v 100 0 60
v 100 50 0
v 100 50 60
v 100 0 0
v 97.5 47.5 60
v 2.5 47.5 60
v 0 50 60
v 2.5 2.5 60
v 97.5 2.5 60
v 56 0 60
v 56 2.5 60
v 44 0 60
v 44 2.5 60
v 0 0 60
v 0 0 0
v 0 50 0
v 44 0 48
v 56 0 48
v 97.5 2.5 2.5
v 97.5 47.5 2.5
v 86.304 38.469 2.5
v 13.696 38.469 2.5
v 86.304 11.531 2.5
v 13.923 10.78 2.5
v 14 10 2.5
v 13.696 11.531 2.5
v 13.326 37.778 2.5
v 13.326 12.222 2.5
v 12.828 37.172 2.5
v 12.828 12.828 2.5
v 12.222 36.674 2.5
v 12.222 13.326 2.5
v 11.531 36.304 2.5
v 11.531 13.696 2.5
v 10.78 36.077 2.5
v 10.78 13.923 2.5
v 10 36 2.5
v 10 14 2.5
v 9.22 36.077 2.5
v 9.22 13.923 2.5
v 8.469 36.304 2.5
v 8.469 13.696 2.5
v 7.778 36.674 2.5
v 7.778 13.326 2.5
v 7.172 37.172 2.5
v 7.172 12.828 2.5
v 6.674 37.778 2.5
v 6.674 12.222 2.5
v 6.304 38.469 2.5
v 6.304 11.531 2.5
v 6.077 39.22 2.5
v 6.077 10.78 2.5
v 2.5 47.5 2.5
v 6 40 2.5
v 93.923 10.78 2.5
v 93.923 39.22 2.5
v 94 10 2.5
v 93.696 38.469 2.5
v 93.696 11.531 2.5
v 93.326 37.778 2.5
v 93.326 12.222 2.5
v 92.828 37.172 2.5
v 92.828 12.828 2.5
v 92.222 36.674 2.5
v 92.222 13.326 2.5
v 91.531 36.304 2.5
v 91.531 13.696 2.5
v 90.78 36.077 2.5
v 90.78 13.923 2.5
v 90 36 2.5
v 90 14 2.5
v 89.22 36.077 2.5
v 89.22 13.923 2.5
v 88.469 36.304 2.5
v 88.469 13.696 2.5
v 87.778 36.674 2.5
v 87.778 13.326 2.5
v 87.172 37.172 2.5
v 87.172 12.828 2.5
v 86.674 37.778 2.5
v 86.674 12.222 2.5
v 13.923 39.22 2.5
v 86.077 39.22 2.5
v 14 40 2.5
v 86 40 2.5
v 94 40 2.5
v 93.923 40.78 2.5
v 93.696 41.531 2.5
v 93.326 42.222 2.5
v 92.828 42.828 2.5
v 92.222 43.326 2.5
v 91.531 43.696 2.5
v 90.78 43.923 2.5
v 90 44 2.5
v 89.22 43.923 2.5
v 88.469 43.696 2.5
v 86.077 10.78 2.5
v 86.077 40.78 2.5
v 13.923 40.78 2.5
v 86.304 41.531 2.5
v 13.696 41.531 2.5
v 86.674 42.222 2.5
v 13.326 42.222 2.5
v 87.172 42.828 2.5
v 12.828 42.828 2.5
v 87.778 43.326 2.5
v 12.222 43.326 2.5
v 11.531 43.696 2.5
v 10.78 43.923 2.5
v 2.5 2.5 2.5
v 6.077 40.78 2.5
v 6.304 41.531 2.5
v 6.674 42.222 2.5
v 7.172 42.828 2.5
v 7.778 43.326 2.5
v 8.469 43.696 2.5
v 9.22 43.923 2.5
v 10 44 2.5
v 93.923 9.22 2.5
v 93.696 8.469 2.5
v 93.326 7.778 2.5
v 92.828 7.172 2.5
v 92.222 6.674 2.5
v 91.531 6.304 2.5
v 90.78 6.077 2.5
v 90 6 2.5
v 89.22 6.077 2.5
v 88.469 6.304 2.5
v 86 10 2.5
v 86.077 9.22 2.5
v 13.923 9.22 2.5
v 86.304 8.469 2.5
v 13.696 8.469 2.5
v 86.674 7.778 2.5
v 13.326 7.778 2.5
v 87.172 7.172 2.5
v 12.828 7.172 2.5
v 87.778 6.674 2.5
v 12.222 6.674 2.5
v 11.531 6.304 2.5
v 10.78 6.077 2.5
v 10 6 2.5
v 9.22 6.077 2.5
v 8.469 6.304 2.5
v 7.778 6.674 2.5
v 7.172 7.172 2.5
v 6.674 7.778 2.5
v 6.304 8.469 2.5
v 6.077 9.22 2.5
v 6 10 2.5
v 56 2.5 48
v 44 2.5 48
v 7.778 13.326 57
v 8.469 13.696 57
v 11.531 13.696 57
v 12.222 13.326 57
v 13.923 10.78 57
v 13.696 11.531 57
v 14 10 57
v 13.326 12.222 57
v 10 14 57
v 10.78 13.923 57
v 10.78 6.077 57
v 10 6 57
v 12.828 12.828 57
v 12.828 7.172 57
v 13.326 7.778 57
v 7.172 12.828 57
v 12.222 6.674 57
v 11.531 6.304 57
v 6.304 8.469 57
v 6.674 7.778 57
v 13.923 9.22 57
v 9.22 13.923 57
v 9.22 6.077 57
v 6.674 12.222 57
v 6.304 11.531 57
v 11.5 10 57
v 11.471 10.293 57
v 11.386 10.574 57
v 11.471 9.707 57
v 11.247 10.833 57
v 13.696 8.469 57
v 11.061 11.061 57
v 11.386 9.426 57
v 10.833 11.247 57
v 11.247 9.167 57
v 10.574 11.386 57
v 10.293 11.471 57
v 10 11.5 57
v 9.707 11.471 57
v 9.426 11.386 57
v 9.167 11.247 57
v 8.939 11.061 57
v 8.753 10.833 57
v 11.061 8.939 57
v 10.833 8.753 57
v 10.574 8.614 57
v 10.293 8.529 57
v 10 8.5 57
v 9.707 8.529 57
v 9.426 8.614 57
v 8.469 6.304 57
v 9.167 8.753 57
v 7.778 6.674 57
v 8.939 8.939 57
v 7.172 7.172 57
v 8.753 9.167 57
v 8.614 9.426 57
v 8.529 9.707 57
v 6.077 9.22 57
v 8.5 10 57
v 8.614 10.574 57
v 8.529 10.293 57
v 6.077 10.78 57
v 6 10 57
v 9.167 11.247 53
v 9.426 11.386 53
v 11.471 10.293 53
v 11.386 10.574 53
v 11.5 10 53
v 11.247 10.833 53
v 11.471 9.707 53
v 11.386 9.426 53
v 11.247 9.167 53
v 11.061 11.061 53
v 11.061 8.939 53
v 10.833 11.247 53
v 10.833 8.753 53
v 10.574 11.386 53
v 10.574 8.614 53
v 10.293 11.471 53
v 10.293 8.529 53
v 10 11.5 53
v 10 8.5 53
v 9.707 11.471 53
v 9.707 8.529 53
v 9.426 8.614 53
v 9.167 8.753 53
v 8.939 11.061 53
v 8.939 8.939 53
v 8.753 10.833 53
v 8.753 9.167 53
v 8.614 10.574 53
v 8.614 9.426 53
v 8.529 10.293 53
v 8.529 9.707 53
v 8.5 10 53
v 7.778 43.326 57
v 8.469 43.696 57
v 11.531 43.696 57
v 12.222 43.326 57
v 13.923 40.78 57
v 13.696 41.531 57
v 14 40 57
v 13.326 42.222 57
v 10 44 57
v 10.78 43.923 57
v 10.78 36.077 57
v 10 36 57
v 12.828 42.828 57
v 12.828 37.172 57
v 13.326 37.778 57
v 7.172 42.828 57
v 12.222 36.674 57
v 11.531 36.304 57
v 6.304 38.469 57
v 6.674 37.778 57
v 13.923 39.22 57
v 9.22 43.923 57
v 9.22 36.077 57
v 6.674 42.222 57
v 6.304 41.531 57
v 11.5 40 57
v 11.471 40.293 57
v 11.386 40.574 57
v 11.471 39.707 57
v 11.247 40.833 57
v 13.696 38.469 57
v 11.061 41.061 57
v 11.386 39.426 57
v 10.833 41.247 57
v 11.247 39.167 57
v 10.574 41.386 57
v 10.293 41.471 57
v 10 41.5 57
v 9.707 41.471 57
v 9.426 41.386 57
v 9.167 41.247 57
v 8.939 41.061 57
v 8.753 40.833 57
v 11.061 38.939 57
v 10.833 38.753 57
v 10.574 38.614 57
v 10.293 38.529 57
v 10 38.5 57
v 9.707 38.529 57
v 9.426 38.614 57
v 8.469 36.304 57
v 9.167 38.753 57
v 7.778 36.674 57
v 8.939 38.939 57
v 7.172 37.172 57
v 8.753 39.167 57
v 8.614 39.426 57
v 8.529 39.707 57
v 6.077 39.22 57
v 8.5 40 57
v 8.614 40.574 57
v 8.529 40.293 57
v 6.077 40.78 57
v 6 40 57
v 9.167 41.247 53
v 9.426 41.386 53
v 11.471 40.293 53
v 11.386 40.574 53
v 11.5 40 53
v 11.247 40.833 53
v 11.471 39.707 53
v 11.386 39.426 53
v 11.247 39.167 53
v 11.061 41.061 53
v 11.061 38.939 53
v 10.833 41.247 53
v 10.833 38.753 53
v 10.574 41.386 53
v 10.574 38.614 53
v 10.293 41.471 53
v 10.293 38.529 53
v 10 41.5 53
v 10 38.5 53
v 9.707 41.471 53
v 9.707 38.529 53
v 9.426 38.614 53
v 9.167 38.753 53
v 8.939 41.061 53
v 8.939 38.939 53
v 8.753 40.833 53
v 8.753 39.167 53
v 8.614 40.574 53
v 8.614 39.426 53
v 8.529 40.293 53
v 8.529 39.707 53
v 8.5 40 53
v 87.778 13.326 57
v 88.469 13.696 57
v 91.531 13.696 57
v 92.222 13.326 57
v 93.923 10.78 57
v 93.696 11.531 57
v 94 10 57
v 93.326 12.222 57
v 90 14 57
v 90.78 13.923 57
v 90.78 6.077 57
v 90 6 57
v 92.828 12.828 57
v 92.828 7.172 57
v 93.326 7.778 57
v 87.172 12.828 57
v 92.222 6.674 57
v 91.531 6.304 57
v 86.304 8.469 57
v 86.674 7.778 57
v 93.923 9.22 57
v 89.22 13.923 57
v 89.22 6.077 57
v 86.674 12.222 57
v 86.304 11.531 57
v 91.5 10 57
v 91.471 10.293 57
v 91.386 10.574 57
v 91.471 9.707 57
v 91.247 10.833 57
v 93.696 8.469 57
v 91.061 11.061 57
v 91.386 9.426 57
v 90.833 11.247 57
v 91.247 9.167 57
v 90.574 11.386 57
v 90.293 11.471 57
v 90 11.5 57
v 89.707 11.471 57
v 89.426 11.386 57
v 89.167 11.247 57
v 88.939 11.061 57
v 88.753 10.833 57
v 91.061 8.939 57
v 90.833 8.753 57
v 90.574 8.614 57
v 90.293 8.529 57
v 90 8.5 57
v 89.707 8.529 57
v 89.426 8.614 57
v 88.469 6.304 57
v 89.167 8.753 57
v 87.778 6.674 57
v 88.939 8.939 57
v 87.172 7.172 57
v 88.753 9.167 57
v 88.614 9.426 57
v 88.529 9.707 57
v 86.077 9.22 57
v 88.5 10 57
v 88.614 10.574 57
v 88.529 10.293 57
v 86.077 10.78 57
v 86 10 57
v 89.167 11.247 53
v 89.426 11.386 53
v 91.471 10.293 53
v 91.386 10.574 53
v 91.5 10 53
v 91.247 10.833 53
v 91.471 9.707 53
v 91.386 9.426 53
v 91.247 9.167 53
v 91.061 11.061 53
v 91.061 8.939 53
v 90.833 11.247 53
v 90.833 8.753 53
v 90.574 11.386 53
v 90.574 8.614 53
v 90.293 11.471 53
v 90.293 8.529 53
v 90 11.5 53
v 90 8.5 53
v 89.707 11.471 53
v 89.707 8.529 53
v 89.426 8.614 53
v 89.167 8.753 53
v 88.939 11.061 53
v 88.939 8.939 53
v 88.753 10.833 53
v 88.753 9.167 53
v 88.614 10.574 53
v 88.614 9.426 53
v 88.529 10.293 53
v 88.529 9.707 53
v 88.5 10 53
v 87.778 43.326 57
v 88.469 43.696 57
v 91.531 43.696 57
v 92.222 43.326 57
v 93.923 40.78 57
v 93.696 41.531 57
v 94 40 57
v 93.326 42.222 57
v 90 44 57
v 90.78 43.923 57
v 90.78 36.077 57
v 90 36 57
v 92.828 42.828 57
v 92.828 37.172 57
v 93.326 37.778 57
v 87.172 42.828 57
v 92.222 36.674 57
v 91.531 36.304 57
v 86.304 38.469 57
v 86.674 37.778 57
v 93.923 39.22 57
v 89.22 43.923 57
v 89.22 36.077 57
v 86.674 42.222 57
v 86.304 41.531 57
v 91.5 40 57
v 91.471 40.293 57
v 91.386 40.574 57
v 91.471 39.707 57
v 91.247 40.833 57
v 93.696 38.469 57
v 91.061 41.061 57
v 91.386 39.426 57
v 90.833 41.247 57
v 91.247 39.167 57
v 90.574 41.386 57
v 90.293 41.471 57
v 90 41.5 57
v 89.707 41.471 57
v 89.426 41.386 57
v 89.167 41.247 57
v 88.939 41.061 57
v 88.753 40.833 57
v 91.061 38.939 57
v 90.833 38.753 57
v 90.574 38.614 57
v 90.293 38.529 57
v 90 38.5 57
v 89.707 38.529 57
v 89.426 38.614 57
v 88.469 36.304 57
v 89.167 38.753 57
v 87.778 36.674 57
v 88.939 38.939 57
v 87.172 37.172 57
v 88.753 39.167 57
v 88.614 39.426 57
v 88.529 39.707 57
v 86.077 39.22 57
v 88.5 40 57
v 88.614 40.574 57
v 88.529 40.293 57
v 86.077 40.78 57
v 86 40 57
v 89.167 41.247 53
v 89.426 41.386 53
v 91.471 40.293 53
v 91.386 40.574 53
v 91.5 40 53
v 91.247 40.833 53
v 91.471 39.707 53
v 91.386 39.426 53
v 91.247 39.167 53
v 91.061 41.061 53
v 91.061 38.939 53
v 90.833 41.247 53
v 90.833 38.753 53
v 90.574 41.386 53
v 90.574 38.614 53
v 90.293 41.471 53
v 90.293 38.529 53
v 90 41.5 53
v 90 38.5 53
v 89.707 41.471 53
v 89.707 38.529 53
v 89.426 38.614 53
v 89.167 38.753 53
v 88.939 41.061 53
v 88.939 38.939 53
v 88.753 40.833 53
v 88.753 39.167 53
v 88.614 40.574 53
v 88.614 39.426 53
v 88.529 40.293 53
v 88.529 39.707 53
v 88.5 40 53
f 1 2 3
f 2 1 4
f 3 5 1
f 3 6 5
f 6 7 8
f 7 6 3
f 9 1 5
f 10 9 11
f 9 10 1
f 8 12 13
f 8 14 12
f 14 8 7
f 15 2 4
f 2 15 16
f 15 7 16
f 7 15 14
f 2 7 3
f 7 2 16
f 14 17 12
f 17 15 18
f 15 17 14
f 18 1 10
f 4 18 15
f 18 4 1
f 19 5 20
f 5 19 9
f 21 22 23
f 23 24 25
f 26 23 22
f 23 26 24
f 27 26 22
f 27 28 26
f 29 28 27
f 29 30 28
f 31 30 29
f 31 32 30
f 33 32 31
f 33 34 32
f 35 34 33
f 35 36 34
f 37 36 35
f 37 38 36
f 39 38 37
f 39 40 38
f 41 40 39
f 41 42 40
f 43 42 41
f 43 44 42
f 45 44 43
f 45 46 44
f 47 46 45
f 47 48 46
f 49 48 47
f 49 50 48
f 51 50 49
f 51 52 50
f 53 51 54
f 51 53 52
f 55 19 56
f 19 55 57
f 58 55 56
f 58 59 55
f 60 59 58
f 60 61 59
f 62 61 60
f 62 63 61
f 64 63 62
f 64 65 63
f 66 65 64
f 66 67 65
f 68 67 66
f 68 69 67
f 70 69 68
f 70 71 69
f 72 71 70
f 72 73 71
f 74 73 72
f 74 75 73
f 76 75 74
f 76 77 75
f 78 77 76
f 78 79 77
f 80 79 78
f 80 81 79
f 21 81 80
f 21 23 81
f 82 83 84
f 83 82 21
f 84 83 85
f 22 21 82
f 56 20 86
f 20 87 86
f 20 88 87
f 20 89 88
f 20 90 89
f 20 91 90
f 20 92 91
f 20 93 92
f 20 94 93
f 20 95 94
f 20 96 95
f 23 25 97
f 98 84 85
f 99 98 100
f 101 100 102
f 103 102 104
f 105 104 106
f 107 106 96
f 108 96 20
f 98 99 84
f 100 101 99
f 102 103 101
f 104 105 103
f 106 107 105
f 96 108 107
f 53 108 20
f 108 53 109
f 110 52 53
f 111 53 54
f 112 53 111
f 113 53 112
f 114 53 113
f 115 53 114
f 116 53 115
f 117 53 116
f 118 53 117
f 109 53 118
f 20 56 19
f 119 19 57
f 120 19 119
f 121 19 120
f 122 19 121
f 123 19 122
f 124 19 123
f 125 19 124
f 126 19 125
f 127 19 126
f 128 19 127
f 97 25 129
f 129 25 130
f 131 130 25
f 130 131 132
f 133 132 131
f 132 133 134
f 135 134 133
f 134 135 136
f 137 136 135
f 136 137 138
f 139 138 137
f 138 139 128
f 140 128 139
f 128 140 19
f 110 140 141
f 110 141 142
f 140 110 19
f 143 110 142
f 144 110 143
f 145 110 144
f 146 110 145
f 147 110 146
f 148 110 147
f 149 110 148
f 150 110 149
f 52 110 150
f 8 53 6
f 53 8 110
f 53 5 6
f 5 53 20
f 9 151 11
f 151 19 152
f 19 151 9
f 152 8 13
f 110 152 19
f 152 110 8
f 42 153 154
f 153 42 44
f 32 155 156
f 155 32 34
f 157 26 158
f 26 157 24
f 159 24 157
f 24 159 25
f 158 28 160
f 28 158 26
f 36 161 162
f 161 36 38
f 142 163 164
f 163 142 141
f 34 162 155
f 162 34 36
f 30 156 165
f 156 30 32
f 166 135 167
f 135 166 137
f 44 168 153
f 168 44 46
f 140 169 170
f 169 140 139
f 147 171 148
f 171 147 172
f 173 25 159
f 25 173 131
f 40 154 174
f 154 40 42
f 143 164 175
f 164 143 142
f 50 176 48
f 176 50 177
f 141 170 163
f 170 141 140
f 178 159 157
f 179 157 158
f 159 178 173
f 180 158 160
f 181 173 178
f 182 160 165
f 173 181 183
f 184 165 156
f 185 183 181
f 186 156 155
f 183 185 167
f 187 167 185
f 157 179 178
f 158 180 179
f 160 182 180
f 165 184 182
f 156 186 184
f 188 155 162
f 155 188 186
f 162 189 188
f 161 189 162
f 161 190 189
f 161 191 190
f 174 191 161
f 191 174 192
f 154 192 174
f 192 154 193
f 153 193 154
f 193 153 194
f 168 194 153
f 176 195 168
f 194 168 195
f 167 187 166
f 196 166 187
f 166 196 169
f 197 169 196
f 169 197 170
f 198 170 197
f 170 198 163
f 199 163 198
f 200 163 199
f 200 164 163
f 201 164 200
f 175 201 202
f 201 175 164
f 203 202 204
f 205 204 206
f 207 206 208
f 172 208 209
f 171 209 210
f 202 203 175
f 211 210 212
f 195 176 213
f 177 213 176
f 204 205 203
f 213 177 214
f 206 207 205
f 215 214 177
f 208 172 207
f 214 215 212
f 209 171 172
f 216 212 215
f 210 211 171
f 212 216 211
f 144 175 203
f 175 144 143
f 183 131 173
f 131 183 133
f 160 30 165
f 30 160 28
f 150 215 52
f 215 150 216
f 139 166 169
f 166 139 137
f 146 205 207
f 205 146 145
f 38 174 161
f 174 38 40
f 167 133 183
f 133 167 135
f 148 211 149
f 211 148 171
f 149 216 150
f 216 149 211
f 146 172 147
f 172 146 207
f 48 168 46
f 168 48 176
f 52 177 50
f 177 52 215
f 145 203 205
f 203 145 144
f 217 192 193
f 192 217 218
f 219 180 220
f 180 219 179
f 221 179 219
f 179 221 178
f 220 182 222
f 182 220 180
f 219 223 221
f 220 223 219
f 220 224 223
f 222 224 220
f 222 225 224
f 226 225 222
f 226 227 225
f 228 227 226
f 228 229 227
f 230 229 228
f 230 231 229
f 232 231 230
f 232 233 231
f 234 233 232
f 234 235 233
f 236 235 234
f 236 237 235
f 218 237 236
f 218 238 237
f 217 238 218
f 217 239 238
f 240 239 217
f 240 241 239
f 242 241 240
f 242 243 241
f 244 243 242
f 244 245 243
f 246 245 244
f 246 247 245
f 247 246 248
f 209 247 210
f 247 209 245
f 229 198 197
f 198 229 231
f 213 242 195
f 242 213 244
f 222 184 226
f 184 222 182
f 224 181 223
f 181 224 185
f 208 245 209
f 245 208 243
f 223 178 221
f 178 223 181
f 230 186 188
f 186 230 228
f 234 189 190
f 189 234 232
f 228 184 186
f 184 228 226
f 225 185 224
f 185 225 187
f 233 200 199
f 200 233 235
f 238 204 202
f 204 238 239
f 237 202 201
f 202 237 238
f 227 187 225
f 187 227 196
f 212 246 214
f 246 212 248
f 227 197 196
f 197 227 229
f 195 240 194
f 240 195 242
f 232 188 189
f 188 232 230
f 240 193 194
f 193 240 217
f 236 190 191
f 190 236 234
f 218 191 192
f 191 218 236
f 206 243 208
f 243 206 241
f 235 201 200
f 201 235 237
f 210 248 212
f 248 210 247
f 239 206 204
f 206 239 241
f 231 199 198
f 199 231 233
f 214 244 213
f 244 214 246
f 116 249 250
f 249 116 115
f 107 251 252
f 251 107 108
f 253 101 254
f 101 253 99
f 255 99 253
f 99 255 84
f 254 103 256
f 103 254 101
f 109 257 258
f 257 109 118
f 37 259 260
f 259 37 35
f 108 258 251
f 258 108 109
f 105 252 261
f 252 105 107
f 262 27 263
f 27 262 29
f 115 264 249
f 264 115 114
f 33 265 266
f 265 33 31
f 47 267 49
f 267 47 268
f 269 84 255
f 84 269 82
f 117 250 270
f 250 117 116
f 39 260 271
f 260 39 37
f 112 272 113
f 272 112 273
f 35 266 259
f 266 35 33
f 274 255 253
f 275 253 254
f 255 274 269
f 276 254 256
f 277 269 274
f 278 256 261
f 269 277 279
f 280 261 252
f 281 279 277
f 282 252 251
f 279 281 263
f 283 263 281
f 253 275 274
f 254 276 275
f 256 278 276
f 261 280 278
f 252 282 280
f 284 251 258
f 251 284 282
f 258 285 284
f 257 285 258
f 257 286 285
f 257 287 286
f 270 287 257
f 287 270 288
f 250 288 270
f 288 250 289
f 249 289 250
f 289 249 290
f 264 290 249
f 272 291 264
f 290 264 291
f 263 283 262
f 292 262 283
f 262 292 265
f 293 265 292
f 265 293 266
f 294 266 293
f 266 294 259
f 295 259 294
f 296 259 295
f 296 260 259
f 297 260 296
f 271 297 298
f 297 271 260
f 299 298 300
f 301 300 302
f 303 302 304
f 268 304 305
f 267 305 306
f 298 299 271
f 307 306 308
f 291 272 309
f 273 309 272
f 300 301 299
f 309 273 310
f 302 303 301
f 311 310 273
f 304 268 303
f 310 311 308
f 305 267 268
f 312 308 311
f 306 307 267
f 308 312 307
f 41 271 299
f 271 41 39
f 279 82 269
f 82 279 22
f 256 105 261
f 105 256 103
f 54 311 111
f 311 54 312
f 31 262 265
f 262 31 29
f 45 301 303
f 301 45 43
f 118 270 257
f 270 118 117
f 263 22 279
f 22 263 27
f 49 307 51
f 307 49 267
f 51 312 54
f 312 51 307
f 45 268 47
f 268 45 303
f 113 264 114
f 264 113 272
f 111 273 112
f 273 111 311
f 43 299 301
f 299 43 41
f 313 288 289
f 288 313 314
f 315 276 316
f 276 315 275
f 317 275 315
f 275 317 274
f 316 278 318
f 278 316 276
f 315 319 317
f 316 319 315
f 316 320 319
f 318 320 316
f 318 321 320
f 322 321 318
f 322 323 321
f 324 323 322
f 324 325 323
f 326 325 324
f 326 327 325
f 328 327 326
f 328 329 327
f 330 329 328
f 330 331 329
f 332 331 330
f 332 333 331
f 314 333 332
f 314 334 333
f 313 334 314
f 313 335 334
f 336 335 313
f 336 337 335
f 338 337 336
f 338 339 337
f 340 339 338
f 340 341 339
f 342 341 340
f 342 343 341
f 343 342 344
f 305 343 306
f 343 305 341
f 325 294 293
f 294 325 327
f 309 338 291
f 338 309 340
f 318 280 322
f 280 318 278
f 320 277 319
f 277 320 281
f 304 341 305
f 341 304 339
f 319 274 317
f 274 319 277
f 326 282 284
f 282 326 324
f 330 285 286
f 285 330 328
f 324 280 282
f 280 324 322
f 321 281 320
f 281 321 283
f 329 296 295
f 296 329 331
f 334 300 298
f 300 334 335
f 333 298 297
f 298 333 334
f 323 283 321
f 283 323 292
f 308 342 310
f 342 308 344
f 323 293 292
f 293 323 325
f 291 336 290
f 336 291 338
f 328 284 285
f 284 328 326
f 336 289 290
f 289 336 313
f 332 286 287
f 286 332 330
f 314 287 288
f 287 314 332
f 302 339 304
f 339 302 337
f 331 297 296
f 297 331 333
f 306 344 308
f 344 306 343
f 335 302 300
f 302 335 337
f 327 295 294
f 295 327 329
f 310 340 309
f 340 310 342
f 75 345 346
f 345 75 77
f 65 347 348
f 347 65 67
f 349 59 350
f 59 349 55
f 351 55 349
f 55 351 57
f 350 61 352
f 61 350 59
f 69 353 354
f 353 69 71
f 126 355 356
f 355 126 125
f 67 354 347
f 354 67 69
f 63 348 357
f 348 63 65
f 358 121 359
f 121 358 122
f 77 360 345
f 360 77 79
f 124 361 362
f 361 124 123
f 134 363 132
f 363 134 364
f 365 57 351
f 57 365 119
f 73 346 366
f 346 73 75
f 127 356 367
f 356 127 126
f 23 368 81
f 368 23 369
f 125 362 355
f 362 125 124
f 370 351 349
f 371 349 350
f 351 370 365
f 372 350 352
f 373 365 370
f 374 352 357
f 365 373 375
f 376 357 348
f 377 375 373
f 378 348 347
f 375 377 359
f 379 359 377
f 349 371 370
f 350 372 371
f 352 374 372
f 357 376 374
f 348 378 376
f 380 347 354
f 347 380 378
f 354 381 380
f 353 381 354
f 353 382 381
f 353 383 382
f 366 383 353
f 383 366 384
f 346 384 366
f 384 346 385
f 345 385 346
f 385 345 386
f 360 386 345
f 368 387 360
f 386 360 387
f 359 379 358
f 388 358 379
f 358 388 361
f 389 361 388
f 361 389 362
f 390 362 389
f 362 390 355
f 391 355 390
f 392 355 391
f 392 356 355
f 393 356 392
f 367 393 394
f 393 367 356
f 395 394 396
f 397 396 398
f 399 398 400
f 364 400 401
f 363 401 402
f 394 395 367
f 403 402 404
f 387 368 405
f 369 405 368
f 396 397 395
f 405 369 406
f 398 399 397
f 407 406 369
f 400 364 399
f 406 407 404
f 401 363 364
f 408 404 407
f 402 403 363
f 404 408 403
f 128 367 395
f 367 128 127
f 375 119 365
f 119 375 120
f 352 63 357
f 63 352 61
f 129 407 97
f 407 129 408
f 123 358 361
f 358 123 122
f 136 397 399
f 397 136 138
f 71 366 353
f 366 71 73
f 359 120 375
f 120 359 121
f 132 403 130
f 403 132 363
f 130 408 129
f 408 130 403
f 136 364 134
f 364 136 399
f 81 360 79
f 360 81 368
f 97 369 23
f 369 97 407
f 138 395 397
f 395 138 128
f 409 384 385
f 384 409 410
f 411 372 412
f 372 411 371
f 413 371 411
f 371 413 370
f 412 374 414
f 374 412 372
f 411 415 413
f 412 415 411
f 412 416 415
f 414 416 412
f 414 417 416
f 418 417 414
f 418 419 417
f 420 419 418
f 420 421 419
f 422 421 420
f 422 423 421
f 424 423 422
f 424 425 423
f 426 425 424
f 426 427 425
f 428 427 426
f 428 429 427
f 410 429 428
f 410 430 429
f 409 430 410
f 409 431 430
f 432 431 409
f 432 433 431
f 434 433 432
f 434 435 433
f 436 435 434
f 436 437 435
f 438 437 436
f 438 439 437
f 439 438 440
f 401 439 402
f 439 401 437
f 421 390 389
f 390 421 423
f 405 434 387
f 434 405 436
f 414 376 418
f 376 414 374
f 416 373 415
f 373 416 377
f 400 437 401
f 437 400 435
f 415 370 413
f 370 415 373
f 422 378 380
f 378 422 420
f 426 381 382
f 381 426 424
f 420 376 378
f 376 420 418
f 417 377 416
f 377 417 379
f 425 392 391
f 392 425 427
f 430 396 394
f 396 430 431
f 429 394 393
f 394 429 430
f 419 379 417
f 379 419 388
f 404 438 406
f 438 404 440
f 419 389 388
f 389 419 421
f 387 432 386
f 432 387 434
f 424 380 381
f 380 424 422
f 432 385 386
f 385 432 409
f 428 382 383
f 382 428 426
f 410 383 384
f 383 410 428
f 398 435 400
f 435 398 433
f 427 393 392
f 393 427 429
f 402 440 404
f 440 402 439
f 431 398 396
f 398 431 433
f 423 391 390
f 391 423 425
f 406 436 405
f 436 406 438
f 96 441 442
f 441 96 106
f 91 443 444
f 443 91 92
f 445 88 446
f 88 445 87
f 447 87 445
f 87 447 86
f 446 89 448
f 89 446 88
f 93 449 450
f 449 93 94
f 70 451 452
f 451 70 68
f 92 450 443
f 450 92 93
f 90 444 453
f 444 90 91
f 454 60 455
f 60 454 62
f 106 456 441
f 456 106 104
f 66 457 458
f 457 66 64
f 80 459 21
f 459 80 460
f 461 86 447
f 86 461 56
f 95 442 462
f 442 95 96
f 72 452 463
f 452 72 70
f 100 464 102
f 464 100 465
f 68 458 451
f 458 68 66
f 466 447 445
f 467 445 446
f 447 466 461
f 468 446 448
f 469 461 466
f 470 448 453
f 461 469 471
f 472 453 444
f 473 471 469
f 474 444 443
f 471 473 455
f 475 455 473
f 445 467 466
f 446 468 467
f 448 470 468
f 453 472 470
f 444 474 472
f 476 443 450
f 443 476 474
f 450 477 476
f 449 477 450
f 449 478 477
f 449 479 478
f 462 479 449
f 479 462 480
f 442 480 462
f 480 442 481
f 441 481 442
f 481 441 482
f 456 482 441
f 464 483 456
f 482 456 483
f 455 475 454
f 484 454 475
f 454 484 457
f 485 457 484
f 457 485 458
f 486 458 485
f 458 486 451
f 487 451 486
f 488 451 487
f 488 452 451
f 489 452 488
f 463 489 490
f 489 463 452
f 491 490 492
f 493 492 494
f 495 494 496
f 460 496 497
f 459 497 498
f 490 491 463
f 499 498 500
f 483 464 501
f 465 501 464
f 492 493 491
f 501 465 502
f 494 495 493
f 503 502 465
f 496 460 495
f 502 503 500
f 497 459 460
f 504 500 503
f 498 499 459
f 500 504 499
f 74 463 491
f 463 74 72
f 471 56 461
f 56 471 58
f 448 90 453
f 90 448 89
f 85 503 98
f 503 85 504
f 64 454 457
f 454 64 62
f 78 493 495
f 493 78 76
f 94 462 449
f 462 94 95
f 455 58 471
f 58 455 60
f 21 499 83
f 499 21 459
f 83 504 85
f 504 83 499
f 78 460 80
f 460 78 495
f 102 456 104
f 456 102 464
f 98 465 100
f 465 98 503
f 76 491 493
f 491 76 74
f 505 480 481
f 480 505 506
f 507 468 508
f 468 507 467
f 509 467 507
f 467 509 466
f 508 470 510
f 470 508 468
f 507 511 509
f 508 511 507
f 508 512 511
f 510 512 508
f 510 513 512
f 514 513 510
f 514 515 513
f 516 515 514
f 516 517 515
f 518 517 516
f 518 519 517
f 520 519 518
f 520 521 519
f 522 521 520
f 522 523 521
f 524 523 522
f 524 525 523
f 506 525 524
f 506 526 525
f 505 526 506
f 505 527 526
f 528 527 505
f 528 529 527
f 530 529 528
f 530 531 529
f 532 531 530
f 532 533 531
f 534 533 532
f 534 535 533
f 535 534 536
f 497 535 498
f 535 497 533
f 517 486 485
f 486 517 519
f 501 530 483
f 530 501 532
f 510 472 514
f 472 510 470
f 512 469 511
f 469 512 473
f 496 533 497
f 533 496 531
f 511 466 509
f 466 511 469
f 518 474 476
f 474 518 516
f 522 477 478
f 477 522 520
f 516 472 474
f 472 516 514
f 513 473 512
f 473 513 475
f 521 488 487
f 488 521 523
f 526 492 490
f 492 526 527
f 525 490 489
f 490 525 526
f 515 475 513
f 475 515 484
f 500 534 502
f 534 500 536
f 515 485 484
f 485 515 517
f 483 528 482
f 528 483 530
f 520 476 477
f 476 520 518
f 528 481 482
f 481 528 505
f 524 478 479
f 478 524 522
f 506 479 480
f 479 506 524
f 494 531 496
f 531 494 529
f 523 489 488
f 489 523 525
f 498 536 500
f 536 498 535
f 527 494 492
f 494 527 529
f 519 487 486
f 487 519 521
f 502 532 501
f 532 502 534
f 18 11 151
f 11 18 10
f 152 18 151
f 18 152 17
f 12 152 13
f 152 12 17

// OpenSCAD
$fn = 32;

// ----------------------------------------------------------------------
// Enclosure box: both enclosure
// ----------------------------------------------------------------------

// --- parameters (mm) ---
box_l = 100;              // outer length, X
box_w = 50;               // outer width, Y
box_h = 60;               // outer height
wall_t = 2.5;             // wall thickness
boss_r = 4;               // corner boss radius
hole_r = 1.5;             // boss screw hole radius
boss_in = 10;             // boss inset from the corners
notch_w = 12;             // cable notch width
notch_h = 12;             // cable notch height

inner_h = box_h - wall_t;  // cavity depth
boss_h = inner_h - 2;  // corner boss height

difference() {
  union() {
    difference() {
      cube([box_l, box_w, box_h]);
      translate([wall_t, wall_t, wall_t])
        cube([box_l - 2 * wall_t, box_w - 2 * wall_t, box_h]);
    }
    for (sx = [0, 1], sy = [0, 1])
      translate([sx ? box_l - boss_in : boss_in,
                 sy ? box_w - boss_in : boss_in, wall_t - 1])
        difference() {
          cylinder(r = boss_r, h = boss_h);
          translate([0, 0, boss_h - 4])
            cylinder(r = hole_r, h = 5);
        }
  }
  translate([box_l / 2 - notch_w / 2, -1, box_h - notch_h])
    cube([notch_w, wall_t + 2, notch_h + 1]);
}
